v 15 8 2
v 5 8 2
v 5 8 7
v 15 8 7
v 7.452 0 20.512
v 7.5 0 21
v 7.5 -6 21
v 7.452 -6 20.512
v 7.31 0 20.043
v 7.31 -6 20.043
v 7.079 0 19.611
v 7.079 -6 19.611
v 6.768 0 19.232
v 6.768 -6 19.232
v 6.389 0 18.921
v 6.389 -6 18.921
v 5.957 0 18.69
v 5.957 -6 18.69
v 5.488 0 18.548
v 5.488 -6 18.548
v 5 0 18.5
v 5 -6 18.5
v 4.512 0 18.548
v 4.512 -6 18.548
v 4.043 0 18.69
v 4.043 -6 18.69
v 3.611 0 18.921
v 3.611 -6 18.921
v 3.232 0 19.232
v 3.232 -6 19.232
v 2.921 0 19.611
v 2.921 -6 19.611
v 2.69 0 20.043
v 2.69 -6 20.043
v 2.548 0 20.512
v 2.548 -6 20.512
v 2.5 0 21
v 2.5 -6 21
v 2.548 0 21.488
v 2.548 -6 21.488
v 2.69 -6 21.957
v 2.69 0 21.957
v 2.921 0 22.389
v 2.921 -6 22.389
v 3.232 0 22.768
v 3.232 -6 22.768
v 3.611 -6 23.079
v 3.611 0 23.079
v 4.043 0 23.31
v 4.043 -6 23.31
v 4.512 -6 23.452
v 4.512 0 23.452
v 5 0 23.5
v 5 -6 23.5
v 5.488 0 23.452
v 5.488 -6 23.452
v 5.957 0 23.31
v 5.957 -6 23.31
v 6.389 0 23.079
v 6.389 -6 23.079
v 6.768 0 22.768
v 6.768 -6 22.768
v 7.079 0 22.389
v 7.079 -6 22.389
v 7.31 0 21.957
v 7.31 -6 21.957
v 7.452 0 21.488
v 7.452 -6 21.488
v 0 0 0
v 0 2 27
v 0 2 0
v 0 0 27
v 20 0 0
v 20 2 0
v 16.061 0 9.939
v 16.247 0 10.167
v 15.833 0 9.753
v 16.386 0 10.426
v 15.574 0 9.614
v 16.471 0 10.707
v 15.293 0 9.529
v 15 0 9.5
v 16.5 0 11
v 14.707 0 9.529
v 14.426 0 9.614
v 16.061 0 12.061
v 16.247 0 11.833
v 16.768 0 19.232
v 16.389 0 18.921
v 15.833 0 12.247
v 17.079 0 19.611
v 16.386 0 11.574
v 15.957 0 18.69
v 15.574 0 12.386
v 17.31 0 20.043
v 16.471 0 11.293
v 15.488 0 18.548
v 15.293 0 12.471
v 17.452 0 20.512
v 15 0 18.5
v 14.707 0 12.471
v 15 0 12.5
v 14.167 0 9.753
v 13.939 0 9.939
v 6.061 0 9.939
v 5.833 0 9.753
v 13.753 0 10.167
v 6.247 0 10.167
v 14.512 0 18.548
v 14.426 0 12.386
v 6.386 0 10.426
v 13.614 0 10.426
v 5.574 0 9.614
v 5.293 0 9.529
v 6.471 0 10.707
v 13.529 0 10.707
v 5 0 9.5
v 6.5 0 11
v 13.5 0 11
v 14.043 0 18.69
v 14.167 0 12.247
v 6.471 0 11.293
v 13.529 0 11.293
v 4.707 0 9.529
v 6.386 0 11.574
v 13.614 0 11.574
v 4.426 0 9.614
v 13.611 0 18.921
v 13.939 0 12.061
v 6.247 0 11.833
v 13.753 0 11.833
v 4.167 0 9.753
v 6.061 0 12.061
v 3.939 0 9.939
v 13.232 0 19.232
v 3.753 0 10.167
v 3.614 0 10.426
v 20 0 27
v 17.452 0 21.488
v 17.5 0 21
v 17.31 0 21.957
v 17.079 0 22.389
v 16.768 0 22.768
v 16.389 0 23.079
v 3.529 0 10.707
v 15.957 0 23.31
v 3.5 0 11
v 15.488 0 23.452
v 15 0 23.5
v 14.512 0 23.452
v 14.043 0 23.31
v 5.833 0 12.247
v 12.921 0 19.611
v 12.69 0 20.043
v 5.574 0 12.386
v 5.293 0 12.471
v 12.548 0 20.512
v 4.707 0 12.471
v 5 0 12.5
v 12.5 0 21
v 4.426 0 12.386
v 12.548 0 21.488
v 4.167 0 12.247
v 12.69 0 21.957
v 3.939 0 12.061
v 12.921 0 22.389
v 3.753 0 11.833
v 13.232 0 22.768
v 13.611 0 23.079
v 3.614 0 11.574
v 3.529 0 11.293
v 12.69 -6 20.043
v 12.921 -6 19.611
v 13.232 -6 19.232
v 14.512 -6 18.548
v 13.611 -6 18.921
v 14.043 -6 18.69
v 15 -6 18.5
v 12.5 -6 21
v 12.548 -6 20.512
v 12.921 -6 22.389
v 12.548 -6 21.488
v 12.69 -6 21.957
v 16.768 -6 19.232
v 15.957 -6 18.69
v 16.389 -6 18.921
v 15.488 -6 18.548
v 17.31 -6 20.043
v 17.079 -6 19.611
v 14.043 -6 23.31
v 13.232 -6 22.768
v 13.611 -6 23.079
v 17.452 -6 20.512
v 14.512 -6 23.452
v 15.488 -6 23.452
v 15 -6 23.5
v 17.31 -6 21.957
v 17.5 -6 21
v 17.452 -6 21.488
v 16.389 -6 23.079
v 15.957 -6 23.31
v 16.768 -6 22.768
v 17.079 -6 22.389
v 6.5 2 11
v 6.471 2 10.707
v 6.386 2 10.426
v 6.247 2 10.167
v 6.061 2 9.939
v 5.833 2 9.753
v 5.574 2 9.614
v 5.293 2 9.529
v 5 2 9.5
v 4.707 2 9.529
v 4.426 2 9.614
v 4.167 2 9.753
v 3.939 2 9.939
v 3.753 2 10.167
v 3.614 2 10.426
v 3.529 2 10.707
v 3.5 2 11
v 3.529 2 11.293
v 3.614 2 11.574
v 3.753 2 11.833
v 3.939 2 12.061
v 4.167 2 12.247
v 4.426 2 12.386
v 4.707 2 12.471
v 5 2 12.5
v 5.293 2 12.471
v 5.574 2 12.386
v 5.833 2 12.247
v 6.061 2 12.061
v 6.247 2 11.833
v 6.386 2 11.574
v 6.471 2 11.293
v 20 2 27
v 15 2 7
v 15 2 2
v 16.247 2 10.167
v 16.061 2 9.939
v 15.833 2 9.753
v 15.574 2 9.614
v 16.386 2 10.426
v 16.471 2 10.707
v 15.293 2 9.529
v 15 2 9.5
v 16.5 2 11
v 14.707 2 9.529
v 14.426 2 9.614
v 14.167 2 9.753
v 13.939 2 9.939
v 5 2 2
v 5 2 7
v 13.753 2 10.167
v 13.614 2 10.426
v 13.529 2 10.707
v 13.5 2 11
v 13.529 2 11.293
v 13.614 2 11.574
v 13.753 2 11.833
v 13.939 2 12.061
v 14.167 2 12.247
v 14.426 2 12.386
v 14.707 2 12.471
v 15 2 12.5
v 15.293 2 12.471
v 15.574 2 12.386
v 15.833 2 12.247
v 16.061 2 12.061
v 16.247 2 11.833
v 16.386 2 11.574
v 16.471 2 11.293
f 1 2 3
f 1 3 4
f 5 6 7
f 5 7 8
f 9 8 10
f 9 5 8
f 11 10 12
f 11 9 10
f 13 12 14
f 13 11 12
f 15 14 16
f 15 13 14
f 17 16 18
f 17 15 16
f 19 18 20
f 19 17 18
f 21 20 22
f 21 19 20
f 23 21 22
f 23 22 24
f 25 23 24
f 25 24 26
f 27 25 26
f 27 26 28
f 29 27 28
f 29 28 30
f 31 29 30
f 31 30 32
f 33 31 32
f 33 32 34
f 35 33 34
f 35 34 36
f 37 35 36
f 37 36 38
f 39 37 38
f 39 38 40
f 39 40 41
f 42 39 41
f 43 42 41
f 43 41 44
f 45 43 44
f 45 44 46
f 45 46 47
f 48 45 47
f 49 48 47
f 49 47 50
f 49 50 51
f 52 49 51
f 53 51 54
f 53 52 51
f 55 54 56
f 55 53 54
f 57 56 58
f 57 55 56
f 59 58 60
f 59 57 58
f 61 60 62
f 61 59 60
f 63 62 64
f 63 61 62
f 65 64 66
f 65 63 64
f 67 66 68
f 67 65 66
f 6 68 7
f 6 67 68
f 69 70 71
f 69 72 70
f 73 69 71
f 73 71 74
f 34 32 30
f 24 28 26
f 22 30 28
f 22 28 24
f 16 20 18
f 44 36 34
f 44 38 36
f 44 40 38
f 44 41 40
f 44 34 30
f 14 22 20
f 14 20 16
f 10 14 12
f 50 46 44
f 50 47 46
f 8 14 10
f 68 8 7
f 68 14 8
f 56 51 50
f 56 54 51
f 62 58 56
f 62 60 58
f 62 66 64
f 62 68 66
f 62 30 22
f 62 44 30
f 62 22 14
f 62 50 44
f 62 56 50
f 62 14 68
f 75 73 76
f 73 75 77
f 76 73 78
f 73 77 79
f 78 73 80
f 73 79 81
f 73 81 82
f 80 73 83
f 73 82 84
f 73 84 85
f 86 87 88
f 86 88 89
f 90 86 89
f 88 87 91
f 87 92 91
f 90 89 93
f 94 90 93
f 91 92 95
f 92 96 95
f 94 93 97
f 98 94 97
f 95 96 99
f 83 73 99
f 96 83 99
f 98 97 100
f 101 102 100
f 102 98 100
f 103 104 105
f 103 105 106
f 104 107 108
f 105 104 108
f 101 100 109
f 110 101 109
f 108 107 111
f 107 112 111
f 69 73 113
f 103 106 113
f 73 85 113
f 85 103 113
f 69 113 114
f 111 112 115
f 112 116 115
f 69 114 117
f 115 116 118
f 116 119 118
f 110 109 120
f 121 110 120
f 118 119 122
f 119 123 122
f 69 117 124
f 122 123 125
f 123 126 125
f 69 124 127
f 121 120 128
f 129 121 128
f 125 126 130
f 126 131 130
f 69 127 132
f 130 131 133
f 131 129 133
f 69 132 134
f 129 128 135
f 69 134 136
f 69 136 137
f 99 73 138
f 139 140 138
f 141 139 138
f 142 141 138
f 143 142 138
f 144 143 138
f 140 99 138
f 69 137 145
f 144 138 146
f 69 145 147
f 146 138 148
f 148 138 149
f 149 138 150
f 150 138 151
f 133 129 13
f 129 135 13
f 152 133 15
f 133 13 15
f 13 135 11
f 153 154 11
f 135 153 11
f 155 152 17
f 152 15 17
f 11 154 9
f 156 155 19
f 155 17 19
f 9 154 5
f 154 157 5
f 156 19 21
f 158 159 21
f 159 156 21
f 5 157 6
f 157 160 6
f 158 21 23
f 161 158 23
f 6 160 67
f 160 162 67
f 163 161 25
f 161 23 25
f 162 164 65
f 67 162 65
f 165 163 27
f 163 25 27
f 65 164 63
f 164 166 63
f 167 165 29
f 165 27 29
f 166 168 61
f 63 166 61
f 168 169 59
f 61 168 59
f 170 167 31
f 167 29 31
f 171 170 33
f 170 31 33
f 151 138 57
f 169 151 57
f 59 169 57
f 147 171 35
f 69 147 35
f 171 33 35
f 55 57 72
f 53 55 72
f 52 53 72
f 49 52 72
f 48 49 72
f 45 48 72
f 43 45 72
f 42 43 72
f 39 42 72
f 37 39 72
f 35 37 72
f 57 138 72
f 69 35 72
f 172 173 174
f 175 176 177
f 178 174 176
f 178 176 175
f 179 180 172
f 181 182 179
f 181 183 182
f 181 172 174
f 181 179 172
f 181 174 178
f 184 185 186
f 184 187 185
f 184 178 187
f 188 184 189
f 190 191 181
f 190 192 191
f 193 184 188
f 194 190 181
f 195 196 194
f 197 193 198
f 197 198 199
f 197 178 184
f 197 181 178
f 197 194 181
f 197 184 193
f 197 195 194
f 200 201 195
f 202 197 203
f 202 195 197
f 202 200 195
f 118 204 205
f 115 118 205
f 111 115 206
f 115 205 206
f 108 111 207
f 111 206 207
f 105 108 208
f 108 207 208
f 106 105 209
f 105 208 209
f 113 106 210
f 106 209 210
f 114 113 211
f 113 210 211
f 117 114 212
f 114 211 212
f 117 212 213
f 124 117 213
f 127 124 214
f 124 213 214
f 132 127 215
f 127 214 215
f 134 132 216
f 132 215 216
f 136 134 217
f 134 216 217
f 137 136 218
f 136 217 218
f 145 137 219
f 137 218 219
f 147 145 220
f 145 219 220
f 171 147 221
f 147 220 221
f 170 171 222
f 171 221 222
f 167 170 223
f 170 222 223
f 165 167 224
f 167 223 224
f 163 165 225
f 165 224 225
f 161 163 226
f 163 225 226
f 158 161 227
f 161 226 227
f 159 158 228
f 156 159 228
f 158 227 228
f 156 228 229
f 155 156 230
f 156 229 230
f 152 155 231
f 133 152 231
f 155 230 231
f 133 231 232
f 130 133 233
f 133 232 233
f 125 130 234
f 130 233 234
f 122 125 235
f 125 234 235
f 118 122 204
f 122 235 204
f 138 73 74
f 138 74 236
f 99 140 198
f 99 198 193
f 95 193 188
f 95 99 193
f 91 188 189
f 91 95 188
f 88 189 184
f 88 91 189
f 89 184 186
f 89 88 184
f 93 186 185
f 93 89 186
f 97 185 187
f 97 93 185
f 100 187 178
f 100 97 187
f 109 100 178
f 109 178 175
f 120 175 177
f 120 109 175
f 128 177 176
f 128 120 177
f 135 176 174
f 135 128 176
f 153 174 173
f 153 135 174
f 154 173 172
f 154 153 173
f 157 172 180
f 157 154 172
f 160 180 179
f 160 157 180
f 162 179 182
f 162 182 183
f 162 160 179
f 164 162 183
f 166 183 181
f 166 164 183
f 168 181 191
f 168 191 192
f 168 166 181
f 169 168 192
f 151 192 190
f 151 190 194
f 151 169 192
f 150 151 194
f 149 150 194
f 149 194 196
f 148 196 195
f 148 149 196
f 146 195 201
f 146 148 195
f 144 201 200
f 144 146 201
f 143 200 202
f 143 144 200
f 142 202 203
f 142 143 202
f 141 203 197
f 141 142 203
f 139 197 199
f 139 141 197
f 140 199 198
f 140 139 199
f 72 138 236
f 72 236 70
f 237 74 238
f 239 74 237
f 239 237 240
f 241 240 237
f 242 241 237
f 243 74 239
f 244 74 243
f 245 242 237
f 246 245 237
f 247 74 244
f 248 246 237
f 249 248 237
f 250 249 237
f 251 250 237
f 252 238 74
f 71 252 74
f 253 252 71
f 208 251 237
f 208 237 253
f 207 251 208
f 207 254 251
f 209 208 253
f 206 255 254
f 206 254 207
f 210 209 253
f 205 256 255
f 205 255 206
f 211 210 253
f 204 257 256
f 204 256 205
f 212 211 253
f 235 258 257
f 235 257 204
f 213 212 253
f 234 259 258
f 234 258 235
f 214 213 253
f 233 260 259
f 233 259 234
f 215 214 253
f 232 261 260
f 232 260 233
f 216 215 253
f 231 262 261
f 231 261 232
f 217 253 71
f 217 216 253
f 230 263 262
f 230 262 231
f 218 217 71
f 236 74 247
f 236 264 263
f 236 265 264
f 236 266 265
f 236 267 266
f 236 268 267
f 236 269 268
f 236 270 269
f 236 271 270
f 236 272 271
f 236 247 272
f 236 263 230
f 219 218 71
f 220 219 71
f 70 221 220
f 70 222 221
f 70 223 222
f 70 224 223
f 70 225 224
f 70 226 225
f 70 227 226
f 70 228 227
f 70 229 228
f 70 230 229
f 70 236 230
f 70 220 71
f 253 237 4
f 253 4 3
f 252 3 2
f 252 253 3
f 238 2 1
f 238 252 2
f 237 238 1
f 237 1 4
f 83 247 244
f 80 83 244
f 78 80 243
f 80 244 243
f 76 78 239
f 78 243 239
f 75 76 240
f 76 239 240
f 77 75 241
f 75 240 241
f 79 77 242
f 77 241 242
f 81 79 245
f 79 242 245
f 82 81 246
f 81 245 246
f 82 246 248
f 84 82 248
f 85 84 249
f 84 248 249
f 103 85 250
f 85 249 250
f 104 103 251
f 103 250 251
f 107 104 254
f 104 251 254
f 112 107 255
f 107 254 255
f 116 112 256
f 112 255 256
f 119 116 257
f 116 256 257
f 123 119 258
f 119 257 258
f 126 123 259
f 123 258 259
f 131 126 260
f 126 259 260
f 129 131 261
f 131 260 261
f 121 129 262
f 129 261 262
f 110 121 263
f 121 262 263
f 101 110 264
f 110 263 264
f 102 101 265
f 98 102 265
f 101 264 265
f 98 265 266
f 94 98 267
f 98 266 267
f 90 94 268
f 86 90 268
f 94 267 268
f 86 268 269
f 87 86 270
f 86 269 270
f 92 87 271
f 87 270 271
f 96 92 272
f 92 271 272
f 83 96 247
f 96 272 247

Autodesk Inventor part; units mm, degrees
ref_plane "YZ Plane" through (0, 0, 0) normal (1, 0, 0) x (0, 1, 0)
ref_plane "XZ Plane" through (0, 0, 0) normal (0, 1, 0) x (-1, 0, 0)
ref_plane "XY Plane" through (0, 0, 0) normal (0, 0, 1) x (1, 0, 0)
sketch "스케치1" plane through (0, 0, 0) normal (0, 1, 0) x (-1, 0, 0)
  line L0 (0, 0) -> (-20, 0)
  line L1 (-20, 0) -> (-20, 27)
  line L2 (-20, 27) -> (0, 27)
  line L3 (0, 27) -> (0, 0)
  dimension "d0" = 20
  dimension "d1" = 27
extrude "돌출1" add sketch "스케치1" along normal blind 2
sketch "스케치2" plane through (0, 2, 0) normal (0, 1, 0) x (1, 0, 0)
  line L0 (20, 0) -> (0, 0) projected
  line L1 (0, 0) -> (0, -27) projected
  line L2 (0, -27) -> (20, -27) projected
  line L3 (20, -27) -> (20, 0) projected
  line L4 (20, 0) -> (0, 0) projected
  circle A0 centre (5, -11) radius 1.5
  circle A1 centre (15, -11) radius 1.5
  dimension "d5" = 3
  dimension "d6" = 3
  dimension "d21" = 5
  dimension "d22" = 5
  dimension "d23" = 11
  dimension "d24" = 11
extrude "돌출2" cut sketch "스케치2" against normal blind 2 contours A0 | A1
sketch "스케치3" plane through (0, 0, 0) normal (0, -1, 0) x (1, 0, 0)
  circle A0 centre (5, 11) radius 1.5 projected
  circle A1 centre (15, 11) radius 1.5 projected
  line L0 (0, 0) -> (20, 0) projected
  line L1 (20, 0) -> (20, 27) projected
  line L2 (20, 27) -> (0, 27) projected
  line L3 (0, 27) -> (0, 0) projected
  line L4 (5, 11) -> (5, 21)
  line L5 (15, 11) -> (15, 21)
  circle A2 centre (5, 21) radius 2.5
  circle A3 centre (15, 21) radius 2.5
  dimension "d9" = 10
  dimension "d10" = 5
  dimension "d11" = 5
extrude "돌출3" add sketch "스케치3" along normal blind 6 contours A2 | A3
sketch "스케치4" plane through (0, 2, 0) normal (0, 1, 0) x (1, 0, 0)
  circle A0 centre (5, -11) radius 1.5 projected
  circle A1 centre (15, -11) radius 1.5 projected
  line L0 (20, 0) -> (0, 0) projected
  line L1 (0, 0) -> (0, -27) projected
  line L2 (0, -27) -> (20, -27) projected
  line L3 (20, -27) -> (20, 0) projected
  line L4 (0, 0) -> (20, 0) projected
  line L5 (5, -2) -> (15, -2)
  line L6 (15, -2) -> (15, -7)
  line L7 (15, -7) -> (5, -7)
  line L8 (5, -7) -> (5, -2)
  dimension "d14" = 2
extrude "돌출4" add sketch "스케치4" along normal blind 6 contours L5 L6 L7 L8
properties part number "IR모듈"
